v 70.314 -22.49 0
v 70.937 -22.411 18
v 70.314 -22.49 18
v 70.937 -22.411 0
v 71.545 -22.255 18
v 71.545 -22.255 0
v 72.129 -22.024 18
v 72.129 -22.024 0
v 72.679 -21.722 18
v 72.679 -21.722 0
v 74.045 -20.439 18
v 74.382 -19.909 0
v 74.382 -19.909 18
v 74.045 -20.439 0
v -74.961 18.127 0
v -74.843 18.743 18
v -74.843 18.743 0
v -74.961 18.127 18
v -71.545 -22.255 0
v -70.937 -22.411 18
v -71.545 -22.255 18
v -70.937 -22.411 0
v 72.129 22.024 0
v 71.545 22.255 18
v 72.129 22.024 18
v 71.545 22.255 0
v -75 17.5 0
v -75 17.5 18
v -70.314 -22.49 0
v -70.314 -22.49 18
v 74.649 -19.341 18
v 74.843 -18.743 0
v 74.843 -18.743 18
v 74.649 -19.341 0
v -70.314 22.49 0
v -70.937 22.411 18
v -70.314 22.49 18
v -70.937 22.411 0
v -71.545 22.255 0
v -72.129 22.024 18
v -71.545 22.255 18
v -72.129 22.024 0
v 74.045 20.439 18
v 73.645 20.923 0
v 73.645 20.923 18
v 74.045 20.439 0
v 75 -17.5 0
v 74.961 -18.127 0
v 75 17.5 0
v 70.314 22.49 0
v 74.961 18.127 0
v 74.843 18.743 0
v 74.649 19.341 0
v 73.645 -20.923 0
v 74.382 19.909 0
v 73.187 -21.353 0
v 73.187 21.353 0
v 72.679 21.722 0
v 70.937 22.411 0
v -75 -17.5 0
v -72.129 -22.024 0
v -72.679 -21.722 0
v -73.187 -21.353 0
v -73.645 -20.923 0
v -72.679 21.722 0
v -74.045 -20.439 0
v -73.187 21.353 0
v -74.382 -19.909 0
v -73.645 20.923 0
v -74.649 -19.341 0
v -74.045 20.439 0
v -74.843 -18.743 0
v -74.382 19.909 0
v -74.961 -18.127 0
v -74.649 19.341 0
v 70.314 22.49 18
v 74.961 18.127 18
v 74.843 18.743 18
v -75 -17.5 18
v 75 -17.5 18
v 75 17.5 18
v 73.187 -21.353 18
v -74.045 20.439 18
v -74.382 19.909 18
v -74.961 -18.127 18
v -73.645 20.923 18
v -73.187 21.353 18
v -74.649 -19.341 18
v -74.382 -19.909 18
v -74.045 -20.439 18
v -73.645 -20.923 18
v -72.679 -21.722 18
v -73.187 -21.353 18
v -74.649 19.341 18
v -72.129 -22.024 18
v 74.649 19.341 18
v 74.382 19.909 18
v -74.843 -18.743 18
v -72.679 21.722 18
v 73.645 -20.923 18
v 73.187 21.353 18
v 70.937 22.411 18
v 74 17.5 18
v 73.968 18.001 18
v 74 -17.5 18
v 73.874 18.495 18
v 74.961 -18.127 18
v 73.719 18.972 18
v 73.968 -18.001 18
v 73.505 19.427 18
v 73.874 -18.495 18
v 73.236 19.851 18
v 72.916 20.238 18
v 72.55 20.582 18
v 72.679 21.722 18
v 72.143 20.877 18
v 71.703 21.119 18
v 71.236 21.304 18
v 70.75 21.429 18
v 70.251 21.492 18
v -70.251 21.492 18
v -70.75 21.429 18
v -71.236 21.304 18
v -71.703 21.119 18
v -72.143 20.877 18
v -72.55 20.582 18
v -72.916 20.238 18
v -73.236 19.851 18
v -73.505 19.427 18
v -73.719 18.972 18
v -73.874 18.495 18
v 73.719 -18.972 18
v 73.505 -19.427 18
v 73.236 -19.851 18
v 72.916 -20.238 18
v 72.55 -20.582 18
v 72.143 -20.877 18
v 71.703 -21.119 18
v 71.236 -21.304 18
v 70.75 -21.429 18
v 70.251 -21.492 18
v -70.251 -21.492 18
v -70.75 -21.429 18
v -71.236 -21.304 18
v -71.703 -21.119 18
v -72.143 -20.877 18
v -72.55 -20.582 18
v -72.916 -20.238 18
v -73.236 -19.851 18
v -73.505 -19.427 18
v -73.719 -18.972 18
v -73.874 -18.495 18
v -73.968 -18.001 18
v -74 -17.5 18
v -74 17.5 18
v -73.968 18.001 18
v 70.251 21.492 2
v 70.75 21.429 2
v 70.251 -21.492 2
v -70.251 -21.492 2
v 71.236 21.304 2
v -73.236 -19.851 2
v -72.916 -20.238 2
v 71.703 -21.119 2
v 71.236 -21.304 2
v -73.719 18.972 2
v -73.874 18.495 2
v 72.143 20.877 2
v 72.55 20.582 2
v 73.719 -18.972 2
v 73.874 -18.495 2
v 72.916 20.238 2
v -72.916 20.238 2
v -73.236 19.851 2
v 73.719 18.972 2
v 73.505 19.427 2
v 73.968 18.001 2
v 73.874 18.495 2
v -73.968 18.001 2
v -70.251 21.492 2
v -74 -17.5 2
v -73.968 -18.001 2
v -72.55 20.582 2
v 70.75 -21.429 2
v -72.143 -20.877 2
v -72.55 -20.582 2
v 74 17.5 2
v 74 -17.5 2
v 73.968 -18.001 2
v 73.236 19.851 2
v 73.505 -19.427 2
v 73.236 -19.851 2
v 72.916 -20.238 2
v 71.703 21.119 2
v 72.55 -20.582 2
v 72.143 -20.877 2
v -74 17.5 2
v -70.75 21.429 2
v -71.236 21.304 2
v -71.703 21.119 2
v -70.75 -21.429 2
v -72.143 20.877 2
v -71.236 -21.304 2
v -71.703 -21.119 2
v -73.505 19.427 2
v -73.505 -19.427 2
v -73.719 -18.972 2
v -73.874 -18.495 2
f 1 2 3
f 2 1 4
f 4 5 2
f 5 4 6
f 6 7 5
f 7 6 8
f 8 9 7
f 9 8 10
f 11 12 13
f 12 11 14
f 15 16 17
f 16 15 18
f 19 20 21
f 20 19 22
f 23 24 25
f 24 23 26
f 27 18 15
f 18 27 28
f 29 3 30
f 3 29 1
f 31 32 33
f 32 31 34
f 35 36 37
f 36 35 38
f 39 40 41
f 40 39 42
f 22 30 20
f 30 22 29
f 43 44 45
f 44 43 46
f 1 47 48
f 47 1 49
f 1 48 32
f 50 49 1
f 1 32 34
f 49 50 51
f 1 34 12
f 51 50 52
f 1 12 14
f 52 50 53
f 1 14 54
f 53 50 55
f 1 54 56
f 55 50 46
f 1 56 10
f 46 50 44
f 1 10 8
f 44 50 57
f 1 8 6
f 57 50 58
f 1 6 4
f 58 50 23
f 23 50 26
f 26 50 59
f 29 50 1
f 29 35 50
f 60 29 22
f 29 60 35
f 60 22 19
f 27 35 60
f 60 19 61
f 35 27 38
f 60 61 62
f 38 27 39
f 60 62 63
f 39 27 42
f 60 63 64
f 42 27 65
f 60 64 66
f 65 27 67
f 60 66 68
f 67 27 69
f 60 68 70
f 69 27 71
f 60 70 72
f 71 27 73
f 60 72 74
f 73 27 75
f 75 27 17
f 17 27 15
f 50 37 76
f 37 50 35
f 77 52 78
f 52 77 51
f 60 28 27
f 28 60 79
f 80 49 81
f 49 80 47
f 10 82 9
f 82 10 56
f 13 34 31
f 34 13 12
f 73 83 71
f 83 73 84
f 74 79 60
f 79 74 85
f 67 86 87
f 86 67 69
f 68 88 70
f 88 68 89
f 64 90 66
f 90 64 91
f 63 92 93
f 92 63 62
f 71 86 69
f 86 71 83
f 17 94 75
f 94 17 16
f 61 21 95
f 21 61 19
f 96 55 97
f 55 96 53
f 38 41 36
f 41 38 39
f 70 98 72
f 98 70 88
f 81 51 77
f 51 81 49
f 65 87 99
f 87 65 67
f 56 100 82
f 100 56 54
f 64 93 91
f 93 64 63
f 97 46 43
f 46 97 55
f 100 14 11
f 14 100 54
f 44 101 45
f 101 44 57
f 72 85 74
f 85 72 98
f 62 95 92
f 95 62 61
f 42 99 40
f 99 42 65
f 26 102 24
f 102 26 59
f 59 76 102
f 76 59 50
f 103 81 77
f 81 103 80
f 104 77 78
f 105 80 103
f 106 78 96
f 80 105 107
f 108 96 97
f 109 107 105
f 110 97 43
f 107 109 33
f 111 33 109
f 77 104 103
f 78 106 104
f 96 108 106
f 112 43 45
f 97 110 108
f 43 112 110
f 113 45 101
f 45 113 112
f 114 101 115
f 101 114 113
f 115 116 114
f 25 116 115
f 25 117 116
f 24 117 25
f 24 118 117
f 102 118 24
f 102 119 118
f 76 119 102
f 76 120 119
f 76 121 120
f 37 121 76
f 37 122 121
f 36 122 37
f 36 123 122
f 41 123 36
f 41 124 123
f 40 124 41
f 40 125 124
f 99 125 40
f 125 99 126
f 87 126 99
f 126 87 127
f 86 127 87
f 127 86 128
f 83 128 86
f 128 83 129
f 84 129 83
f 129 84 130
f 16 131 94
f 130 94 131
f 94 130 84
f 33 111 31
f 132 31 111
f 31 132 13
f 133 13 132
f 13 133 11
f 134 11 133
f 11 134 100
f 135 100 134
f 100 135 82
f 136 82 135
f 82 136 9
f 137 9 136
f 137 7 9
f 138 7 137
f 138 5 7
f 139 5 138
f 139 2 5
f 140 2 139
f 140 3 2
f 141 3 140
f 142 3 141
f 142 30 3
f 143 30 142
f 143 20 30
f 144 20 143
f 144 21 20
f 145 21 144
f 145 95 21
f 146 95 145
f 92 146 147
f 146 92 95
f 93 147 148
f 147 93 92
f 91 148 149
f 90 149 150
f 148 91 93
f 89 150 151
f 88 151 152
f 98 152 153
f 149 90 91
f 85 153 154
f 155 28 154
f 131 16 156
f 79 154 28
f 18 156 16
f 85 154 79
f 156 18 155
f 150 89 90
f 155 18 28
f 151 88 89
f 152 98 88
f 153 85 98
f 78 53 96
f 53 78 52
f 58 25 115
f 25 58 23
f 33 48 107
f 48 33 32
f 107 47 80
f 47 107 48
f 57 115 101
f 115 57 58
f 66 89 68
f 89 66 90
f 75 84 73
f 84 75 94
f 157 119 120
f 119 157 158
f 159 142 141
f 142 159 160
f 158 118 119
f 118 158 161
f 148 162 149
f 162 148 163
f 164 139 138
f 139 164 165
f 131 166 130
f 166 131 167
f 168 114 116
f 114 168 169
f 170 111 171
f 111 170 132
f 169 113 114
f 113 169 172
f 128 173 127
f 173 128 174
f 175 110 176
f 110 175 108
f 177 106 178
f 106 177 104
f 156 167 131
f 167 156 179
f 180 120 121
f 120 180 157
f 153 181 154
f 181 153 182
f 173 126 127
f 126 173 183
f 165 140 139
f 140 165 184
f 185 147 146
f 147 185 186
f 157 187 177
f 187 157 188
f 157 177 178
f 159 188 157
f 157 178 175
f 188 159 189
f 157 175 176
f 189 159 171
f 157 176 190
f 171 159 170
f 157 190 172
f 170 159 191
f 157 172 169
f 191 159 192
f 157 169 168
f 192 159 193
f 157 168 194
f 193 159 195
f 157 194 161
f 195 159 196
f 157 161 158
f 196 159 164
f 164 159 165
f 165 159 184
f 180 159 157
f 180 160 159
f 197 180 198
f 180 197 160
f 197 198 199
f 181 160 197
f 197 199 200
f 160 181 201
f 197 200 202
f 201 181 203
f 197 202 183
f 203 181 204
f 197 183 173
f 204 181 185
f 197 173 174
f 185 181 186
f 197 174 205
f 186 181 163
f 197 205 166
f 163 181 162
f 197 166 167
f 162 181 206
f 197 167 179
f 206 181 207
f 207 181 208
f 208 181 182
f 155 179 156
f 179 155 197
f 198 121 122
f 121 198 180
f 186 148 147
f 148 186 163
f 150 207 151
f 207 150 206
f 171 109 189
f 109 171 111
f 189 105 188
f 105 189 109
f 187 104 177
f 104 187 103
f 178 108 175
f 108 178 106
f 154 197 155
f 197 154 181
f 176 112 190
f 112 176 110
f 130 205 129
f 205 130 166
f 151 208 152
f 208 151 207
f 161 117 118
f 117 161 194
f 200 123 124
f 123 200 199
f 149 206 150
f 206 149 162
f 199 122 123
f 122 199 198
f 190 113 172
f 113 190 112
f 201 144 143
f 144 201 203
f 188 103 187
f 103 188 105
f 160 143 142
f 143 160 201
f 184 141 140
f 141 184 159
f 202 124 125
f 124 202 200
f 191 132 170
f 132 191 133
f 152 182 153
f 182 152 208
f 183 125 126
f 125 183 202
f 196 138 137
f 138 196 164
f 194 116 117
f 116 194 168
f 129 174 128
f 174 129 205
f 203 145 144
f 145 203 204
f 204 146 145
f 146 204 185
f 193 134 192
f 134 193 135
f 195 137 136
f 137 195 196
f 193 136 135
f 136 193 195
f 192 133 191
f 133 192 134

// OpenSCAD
$fn = 50;


difference() {
	union() {
		hull() {
			translate(v = [-70.0000000000, 17.5000000000, 0]) {
				cylinder(h = 18, r = 5);
			}
			translate(v = [70.0000000000, 17.5000000000, 0]) {
				cylinder(h = 18, r = 5);
			}
			translate(v = [-70.0000000000, -17.5000000000, 0]) {
				cylinder(h = 18, r = 5);
			}
			translate(v = [70.0000000000, -17.5000000000, 0]) {
				cylinder(h = 18, r = 5);
			}
		}
	}
	union() {
		translate(v = [0, 0, 2]) {
			hull() {
				translate(v = [-70.0000000000, 17.5000000000, 0]) {
					cylinder(h = 16, r = 4);
				}
				translate(v = [70.0000000000, 17.5000000000, 0]) {
					cylinder(h = 16, r = 4);
				}
				translate(v = [-70.0000000000, -17.5000000000, 0]) {
					cylinder(h = 16, r = 4);
				}
				translate(v = [70.0000000000, -17.5000000000, 0]) {
					cylinder(h = 16, r = 4);
				}
			}
		}
	}
}
